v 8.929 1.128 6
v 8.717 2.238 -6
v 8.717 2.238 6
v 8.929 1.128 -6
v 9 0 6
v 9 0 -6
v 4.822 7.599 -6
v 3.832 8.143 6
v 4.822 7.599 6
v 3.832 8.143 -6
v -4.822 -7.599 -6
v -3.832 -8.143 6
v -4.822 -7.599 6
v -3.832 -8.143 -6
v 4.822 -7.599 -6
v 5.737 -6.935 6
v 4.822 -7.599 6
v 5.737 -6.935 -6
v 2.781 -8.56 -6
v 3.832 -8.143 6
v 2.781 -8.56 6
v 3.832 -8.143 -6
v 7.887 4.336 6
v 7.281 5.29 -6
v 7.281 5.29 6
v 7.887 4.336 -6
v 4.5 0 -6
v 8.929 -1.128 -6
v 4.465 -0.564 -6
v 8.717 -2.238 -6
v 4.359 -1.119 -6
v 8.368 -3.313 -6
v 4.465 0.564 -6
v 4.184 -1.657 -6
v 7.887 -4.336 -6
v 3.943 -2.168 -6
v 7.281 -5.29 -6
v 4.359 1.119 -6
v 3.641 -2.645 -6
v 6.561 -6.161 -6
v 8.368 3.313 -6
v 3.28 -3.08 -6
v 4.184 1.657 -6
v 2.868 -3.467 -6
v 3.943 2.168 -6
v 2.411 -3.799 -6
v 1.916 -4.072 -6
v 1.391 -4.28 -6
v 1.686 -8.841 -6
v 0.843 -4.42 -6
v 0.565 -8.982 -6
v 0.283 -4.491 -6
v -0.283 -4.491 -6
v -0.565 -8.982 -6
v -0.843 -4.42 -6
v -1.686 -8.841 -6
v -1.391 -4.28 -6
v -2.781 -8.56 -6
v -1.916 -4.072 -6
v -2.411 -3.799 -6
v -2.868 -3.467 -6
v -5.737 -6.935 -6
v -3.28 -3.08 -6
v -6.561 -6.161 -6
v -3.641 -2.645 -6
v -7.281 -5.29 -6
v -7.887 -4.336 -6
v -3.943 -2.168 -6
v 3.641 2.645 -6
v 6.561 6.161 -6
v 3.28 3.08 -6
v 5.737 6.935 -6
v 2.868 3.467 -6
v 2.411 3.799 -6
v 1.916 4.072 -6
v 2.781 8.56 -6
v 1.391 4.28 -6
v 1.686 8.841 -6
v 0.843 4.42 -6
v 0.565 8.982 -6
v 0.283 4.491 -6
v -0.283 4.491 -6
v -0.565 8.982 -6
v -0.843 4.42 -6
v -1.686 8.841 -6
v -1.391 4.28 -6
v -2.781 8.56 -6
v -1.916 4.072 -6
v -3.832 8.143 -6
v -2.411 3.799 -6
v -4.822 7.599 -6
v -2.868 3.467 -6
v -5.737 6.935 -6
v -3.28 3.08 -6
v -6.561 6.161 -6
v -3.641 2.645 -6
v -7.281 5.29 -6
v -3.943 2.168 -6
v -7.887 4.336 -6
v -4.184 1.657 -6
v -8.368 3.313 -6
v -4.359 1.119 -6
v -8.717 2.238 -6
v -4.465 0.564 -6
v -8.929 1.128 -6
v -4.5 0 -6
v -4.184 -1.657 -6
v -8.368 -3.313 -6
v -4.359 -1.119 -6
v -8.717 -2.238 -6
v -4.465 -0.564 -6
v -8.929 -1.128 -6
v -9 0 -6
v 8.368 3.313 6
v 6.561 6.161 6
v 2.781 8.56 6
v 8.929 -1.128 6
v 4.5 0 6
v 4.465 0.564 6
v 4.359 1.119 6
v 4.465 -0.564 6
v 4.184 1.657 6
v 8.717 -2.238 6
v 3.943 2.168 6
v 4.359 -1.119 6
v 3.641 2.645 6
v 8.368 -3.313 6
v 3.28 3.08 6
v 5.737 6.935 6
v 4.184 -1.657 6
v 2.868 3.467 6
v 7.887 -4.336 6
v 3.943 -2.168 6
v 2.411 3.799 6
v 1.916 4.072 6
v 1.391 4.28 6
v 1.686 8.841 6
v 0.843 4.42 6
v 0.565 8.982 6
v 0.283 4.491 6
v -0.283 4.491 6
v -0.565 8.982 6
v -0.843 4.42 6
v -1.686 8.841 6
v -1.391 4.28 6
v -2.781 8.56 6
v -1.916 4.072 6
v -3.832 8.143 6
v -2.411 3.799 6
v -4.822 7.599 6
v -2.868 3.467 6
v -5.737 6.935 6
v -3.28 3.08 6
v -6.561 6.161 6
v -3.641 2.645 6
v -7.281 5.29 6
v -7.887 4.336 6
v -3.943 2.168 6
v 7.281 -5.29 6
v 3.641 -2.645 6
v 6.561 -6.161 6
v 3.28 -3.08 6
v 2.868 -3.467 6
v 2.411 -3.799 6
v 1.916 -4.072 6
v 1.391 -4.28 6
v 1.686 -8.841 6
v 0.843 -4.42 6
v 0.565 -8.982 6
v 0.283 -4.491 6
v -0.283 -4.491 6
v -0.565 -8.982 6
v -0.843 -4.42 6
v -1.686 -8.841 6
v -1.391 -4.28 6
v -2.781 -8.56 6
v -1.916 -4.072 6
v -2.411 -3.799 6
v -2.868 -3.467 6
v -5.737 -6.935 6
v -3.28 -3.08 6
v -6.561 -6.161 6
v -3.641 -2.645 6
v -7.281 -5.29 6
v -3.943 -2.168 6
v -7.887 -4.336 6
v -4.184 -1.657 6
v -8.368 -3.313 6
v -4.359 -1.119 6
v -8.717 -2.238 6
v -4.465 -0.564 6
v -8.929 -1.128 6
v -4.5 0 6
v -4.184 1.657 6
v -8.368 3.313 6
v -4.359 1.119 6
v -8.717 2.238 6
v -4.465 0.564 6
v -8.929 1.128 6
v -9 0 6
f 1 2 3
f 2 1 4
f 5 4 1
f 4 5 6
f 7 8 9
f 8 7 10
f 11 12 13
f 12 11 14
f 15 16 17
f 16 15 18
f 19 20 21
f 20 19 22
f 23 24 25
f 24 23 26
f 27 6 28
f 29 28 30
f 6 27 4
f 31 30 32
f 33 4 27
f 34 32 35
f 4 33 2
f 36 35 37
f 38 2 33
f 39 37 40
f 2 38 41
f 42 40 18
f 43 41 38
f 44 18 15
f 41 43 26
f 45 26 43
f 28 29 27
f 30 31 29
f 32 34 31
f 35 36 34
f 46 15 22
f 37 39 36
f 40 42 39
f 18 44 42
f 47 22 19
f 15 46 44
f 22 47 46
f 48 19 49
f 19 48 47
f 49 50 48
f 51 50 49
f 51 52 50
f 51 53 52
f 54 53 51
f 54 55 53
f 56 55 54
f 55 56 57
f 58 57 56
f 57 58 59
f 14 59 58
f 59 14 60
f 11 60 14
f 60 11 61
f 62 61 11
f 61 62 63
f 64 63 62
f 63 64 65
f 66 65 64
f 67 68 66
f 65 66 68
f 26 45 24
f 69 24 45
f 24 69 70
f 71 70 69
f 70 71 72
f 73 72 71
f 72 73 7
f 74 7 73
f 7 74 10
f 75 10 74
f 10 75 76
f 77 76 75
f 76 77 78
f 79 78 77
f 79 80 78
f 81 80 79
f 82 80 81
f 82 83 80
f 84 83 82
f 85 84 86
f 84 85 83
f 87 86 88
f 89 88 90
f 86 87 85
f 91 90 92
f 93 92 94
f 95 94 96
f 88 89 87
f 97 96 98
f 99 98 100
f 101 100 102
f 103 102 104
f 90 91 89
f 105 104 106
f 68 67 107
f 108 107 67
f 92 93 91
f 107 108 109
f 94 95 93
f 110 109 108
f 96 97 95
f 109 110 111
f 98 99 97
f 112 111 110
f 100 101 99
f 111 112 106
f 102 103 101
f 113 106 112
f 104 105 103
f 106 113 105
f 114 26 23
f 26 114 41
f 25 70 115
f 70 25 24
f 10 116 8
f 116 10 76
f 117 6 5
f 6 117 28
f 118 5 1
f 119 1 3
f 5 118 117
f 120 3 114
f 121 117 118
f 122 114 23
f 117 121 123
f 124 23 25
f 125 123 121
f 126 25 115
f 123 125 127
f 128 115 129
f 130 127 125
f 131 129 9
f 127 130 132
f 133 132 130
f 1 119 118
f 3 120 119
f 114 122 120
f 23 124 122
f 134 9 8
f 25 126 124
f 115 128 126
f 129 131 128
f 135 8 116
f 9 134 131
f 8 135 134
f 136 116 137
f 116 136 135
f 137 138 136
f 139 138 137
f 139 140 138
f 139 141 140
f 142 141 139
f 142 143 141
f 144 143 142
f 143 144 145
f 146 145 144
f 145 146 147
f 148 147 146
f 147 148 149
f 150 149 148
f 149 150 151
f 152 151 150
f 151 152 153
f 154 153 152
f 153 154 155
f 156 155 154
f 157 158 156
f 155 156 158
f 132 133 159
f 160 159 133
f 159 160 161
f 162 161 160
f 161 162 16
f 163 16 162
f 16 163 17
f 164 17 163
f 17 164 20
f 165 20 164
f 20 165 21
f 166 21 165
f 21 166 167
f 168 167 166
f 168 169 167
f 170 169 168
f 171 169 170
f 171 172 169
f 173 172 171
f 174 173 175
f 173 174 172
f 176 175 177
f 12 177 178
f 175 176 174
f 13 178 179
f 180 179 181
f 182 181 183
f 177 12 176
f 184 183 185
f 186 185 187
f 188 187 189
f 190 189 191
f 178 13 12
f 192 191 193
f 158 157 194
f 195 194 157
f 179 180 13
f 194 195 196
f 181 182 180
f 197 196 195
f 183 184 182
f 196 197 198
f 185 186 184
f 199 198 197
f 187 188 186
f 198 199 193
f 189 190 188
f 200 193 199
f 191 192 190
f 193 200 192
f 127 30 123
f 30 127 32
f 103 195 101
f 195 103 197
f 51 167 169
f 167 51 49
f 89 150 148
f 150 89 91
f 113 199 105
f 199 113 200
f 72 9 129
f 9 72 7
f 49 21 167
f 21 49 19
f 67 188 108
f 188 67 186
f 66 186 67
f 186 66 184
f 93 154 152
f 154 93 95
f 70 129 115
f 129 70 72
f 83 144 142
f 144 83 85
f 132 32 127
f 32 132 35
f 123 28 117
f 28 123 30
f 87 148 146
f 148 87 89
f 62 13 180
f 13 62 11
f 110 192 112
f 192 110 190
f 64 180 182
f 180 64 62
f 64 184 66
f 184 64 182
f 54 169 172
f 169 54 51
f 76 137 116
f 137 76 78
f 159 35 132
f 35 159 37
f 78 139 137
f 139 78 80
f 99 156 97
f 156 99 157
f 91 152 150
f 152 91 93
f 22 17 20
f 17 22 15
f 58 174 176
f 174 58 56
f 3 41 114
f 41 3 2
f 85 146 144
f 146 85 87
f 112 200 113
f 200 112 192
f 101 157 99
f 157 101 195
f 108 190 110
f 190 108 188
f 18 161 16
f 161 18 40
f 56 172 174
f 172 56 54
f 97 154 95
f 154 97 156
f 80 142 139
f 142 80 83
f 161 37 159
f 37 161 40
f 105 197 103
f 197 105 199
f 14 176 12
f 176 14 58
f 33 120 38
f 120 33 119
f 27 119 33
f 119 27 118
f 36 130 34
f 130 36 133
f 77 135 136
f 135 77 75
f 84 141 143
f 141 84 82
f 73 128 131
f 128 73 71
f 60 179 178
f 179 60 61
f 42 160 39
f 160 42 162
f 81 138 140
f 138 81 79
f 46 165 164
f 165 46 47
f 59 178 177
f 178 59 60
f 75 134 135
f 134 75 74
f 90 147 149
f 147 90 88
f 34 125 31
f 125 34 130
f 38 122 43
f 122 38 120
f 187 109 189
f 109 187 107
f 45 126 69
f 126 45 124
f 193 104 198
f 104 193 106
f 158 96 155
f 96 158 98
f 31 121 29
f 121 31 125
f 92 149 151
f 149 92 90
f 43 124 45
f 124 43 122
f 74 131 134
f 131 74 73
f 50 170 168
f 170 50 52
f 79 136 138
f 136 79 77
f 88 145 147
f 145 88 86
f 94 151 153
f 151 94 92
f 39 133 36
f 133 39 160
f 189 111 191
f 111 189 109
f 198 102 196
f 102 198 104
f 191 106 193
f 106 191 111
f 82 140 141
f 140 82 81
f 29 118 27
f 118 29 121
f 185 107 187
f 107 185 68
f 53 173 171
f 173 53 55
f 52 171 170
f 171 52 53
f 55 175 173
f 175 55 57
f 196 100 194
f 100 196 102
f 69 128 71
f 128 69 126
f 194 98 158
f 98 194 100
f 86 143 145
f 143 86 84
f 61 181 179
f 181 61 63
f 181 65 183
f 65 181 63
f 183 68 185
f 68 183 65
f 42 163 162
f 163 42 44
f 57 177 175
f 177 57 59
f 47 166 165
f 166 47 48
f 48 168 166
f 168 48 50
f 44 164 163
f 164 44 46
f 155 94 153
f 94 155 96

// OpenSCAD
$fn = 50;


difference() {
	union() {
		translate(v = [0, 0, -6.0000000000]) {
			cylinder(h = 12, r = 9.0000000000);
		}
	}
	union() {
		translate(v = [0, 0, -100.0000000000]) {
			cylinder(h = 200, r = 4.5000000000);
		}
	}
}
